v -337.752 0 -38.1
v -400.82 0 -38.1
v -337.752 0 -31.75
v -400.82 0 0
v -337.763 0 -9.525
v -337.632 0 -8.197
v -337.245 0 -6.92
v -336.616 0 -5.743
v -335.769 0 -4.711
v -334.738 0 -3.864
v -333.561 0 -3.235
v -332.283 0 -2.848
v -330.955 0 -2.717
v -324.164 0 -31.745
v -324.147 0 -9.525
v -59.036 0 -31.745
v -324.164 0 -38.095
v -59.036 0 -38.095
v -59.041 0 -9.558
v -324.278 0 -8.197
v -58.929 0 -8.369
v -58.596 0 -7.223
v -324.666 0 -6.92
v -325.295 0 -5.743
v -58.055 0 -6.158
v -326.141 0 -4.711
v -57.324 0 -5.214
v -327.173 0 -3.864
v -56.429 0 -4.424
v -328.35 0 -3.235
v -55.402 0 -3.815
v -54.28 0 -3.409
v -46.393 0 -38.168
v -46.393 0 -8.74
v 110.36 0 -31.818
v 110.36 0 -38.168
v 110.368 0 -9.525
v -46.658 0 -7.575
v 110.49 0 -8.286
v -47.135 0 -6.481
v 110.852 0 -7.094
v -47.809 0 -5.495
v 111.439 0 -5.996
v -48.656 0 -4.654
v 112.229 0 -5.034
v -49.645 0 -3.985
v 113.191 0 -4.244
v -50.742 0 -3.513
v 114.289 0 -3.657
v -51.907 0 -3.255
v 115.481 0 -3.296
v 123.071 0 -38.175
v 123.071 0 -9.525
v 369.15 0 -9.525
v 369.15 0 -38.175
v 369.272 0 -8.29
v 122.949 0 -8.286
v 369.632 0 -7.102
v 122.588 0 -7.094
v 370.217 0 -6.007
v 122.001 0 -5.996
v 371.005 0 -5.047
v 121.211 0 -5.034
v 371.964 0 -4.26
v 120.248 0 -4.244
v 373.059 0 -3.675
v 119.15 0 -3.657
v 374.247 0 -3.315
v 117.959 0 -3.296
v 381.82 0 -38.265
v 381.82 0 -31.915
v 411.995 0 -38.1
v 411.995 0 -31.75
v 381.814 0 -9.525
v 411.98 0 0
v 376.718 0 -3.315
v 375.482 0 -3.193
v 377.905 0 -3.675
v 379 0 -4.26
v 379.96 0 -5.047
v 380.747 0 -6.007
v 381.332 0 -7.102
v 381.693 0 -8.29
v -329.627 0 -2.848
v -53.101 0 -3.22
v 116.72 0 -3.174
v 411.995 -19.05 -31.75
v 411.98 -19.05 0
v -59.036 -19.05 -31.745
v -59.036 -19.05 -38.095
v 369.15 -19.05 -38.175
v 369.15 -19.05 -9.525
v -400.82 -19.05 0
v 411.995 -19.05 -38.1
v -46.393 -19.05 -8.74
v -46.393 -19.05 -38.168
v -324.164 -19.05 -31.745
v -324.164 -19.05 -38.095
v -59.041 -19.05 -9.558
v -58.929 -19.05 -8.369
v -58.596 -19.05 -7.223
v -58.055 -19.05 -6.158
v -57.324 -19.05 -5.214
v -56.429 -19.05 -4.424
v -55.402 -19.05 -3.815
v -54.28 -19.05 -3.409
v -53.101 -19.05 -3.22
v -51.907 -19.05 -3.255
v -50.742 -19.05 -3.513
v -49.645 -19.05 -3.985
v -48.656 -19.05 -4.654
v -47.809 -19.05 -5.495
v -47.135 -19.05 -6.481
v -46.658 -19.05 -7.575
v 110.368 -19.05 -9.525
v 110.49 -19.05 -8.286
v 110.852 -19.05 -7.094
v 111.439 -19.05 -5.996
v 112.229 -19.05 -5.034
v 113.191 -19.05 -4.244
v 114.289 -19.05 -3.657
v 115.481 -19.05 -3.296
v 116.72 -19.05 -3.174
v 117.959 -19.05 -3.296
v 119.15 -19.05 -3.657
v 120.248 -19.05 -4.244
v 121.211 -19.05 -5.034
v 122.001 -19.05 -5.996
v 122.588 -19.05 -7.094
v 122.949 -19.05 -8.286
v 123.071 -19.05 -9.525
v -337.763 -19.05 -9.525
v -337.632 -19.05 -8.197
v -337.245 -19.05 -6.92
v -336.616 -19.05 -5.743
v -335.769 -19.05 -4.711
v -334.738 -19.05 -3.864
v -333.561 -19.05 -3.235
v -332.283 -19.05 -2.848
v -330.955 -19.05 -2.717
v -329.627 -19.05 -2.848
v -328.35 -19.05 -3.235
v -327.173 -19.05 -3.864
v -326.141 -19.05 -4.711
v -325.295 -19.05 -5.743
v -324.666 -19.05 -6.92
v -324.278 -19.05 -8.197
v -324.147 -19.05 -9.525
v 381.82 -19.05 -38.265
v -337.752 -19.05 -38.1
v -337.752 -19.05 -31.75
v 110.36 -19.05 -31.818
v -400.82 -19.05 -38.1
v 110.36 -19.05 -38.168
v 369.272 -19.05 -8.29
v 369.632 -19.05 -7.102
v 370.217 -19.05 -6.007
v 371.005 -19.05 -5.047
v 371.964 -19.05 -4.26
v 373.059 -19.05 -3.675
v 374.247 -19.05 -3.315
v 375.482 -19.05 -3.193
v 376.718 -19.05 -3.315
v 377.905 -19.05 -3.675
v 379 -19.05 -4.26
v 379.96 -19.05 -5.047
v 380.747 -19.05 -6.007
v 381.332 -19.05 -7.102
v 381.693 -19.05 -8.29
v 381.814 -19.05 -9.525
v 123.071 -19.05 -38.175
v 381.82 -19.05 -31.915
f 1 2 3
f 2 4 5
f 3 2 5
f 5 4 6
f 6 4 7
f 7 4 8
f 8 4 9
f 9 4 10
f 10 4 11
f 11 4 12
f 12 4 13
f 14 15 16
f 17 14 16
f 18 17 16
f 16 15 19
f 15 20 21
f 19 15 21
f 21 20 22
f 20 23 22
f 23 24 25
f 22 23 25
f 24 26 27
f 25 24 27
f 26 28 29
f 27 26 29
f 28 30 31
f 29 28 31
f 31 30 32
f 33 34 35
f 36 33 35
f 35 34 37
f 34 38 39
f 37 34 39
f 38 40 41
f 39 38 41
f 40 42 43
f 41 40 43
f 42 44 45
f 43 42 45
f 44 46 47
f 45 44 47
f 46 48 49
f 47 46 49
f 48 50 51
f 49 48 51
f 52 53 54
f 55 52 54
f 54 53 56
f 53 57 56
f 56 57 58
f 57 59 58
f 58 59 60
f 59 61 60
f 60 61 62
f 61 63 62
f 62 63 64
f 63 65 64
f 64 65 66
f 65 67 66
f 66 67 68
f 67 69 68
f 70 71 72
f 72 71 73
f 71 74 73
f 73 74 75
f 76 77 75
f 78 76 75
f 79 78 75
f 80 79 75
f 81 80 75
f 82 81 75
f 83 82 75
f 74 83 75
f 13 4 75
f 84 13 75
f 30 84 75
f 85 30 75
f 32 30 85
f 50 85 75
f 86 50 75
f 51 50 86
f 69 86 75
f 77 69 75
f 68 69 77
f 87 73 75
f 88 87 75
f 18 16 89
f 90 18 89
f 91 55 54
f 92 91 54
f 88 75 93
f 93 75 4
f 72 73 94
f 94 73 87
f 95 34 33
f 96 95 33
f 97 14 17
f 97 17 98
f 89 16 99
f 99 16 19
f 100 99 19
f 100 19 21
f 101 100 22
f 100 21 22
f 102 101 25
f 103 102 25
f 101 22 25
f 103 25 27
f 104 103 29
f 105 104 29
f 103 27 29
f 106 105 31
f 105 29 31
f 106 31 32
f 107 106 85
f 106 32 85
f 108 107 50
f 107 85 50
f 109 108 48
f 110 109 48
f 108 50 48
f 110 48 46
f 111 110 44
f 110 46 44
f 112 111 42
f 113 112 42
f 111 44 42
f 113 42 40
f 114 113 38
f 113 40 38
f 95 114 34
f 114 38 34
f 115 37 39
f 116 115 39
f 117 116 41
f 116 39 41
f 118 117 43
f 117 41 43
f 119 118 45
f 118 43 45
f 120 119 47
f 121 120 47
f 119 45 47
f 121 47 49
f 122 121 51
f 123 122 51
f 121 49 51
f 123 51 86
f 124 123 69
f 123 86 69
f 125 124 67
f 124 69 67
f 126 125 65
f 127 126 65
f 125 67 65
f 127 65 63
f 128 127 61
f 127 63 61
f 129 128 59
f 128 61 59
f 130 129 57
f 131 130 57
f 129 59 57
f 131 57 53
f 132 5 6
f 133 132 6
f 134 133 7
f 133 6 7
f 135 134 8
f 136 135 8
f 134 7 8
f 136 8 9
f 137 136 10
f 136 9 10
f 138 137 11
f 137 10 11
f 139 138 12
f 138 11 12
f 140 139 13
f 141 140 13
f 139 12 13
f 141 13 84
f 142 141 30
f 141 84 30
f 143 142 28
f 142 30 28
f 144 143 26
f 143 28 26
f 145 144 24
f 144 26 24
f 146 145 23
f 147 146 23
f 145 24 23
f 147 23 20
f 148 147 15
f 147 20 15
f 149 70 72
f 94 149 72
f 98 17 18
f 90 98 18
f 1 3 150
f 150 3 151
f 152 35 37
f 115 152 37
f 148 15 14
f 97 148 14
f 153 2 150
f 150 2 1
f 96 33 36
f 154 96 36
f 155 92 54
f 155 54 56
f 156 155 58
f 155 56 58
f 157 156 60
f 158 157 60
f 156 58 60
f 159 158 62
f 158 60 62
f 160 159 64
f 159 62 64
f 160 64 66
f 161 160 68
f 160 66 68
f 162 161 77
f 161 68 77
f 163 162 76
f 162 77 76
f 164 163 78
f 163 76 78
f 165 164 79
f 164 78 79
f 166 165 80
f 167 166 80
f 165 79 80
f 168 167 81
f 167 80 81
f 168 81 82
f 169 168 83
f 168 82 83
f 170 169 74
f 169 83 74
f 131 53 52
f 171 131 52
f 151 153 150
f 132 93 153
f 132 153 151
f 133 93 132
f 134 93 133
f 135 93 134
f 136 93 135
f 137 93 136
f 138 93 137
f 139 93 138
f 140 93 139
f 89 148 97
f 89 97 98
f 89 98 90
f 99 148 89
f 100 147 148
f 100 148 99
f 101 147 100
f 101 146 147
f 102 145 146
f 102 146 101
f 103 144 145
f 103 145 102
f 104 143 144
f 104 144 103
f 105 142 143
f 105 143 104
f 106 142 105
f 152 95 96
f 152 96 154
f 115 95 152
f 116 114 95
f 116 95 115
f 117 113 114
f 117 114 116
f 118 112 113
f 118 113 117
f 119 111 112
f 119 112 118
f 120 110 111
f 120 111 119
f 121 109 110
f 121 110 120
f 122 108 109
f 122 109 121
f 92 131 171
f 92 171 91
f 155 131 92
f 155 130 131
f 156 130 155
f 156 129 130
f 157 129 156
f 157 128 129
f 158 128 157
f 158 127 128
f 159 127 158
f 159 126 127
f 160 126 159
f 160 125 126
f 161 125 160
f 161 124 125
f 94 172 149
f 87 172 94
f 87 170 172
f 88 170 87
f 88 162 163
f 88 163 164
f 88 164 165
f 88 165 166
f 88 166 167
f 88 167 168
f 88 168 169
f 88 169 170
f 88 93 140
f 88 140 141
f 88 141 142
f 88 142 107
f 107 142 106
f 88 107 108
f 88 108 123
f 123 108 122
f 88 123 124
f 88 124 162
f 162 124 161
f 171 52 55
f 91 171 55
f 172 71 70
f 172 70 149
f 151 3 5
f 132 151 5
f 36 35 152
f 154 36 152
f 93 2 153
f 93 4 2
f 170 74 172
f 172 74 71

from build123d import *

# Parameters (mm, degrees)
F1_DEPTH = 19.05
F2_DEPTH = 6.35


with BuildPart() as f1:
    # F0 (on Front) → F1 (new body)
    with BuildSketch(Plane.XZ):
        with BuildLine():
            Line((411.9802786096, 0), (-400.8197213904, 0))
            Line((-400.8197213904, 0), (-400.8197213904, -31.75))
            Line((-400.8197213904, -31.75), (-337.7515673637, -31.75))
            Line((-337.7515673637, -31.75), (-337.7632062468, -9.525))
            ThreePointArc((-337.7632062468, -9.525), (-330.9552743476, -2.7170681008), (-324.1473424483, -9.525))
            Line((-324.1473424483, -9.525), (-324.1642587247, -31.7445658147))
            Line((-324.1642587247, -31.7445658147), (-59.0364138831, -31.7445658147))
            Line((-59.0364138831, -31.7445658147), (-59.040557391, -9.5579193539))
            ThreePointArc((-59.040557391, -9.5579193539), (-53.1006716645, -3.2200452284), (-46.393480585, -8.7395088525))
            Line((-46.393480585, -8.7395088525), (-46.393480585, -31.8178460419))
            Line((-46.393480585, -31.8178460419), (110.3600561619, -31.8178460419))
            Line((110.3600561619, -31.8178460419), (110.368364275, -9.525))
            ThreePointArc((110.368364275, -9.525), (116.7197256524, -3.1736386226), (123.0710870299, -9.525))
            Line((123.0710870299, -9.525), (123.0710870299, -31.8254381418))
            Line((123.0710870299, -31.8254381418), (369.150060884, -31.8254381418))
            Line((369.150060884, -31.8254381418), (369.150060884, -9.525))
            ThreePointArc((369.150060884, -9.525), (375.4822256524, -3.1928352315), (381.8143904209, -9.525))
            Line((381.8143904209, -9.525), (381.8199747045, -31.9146215908))
            Line((381.8199747045, -31.9146215908), (411.9947256524, -31.75))
            Line((411.9947256524, -31.75), (411.9802786096, 0))
        make_face()
    extrude(amount=F1_DEPTH)

    # F2 (add): faces of the model
    f2_faces = [f1.faces().sort_by_distance(p)[0] for p in [
        (-369.2856443771, -9.525, -31.75),
        (-191.6003363039, -9.525, -31.7445658147),
        (31.9832877884, -9.525, -31.8178460419),
        (246.1105739569, -9.525, -31.8254381418),
        (396.9073501785, -9.525, -31.8323107954),
    ]]
    extrude(f2_faces, amount=F2_DEPTH, dir=(0, 0, -1))


solid = f1.part
